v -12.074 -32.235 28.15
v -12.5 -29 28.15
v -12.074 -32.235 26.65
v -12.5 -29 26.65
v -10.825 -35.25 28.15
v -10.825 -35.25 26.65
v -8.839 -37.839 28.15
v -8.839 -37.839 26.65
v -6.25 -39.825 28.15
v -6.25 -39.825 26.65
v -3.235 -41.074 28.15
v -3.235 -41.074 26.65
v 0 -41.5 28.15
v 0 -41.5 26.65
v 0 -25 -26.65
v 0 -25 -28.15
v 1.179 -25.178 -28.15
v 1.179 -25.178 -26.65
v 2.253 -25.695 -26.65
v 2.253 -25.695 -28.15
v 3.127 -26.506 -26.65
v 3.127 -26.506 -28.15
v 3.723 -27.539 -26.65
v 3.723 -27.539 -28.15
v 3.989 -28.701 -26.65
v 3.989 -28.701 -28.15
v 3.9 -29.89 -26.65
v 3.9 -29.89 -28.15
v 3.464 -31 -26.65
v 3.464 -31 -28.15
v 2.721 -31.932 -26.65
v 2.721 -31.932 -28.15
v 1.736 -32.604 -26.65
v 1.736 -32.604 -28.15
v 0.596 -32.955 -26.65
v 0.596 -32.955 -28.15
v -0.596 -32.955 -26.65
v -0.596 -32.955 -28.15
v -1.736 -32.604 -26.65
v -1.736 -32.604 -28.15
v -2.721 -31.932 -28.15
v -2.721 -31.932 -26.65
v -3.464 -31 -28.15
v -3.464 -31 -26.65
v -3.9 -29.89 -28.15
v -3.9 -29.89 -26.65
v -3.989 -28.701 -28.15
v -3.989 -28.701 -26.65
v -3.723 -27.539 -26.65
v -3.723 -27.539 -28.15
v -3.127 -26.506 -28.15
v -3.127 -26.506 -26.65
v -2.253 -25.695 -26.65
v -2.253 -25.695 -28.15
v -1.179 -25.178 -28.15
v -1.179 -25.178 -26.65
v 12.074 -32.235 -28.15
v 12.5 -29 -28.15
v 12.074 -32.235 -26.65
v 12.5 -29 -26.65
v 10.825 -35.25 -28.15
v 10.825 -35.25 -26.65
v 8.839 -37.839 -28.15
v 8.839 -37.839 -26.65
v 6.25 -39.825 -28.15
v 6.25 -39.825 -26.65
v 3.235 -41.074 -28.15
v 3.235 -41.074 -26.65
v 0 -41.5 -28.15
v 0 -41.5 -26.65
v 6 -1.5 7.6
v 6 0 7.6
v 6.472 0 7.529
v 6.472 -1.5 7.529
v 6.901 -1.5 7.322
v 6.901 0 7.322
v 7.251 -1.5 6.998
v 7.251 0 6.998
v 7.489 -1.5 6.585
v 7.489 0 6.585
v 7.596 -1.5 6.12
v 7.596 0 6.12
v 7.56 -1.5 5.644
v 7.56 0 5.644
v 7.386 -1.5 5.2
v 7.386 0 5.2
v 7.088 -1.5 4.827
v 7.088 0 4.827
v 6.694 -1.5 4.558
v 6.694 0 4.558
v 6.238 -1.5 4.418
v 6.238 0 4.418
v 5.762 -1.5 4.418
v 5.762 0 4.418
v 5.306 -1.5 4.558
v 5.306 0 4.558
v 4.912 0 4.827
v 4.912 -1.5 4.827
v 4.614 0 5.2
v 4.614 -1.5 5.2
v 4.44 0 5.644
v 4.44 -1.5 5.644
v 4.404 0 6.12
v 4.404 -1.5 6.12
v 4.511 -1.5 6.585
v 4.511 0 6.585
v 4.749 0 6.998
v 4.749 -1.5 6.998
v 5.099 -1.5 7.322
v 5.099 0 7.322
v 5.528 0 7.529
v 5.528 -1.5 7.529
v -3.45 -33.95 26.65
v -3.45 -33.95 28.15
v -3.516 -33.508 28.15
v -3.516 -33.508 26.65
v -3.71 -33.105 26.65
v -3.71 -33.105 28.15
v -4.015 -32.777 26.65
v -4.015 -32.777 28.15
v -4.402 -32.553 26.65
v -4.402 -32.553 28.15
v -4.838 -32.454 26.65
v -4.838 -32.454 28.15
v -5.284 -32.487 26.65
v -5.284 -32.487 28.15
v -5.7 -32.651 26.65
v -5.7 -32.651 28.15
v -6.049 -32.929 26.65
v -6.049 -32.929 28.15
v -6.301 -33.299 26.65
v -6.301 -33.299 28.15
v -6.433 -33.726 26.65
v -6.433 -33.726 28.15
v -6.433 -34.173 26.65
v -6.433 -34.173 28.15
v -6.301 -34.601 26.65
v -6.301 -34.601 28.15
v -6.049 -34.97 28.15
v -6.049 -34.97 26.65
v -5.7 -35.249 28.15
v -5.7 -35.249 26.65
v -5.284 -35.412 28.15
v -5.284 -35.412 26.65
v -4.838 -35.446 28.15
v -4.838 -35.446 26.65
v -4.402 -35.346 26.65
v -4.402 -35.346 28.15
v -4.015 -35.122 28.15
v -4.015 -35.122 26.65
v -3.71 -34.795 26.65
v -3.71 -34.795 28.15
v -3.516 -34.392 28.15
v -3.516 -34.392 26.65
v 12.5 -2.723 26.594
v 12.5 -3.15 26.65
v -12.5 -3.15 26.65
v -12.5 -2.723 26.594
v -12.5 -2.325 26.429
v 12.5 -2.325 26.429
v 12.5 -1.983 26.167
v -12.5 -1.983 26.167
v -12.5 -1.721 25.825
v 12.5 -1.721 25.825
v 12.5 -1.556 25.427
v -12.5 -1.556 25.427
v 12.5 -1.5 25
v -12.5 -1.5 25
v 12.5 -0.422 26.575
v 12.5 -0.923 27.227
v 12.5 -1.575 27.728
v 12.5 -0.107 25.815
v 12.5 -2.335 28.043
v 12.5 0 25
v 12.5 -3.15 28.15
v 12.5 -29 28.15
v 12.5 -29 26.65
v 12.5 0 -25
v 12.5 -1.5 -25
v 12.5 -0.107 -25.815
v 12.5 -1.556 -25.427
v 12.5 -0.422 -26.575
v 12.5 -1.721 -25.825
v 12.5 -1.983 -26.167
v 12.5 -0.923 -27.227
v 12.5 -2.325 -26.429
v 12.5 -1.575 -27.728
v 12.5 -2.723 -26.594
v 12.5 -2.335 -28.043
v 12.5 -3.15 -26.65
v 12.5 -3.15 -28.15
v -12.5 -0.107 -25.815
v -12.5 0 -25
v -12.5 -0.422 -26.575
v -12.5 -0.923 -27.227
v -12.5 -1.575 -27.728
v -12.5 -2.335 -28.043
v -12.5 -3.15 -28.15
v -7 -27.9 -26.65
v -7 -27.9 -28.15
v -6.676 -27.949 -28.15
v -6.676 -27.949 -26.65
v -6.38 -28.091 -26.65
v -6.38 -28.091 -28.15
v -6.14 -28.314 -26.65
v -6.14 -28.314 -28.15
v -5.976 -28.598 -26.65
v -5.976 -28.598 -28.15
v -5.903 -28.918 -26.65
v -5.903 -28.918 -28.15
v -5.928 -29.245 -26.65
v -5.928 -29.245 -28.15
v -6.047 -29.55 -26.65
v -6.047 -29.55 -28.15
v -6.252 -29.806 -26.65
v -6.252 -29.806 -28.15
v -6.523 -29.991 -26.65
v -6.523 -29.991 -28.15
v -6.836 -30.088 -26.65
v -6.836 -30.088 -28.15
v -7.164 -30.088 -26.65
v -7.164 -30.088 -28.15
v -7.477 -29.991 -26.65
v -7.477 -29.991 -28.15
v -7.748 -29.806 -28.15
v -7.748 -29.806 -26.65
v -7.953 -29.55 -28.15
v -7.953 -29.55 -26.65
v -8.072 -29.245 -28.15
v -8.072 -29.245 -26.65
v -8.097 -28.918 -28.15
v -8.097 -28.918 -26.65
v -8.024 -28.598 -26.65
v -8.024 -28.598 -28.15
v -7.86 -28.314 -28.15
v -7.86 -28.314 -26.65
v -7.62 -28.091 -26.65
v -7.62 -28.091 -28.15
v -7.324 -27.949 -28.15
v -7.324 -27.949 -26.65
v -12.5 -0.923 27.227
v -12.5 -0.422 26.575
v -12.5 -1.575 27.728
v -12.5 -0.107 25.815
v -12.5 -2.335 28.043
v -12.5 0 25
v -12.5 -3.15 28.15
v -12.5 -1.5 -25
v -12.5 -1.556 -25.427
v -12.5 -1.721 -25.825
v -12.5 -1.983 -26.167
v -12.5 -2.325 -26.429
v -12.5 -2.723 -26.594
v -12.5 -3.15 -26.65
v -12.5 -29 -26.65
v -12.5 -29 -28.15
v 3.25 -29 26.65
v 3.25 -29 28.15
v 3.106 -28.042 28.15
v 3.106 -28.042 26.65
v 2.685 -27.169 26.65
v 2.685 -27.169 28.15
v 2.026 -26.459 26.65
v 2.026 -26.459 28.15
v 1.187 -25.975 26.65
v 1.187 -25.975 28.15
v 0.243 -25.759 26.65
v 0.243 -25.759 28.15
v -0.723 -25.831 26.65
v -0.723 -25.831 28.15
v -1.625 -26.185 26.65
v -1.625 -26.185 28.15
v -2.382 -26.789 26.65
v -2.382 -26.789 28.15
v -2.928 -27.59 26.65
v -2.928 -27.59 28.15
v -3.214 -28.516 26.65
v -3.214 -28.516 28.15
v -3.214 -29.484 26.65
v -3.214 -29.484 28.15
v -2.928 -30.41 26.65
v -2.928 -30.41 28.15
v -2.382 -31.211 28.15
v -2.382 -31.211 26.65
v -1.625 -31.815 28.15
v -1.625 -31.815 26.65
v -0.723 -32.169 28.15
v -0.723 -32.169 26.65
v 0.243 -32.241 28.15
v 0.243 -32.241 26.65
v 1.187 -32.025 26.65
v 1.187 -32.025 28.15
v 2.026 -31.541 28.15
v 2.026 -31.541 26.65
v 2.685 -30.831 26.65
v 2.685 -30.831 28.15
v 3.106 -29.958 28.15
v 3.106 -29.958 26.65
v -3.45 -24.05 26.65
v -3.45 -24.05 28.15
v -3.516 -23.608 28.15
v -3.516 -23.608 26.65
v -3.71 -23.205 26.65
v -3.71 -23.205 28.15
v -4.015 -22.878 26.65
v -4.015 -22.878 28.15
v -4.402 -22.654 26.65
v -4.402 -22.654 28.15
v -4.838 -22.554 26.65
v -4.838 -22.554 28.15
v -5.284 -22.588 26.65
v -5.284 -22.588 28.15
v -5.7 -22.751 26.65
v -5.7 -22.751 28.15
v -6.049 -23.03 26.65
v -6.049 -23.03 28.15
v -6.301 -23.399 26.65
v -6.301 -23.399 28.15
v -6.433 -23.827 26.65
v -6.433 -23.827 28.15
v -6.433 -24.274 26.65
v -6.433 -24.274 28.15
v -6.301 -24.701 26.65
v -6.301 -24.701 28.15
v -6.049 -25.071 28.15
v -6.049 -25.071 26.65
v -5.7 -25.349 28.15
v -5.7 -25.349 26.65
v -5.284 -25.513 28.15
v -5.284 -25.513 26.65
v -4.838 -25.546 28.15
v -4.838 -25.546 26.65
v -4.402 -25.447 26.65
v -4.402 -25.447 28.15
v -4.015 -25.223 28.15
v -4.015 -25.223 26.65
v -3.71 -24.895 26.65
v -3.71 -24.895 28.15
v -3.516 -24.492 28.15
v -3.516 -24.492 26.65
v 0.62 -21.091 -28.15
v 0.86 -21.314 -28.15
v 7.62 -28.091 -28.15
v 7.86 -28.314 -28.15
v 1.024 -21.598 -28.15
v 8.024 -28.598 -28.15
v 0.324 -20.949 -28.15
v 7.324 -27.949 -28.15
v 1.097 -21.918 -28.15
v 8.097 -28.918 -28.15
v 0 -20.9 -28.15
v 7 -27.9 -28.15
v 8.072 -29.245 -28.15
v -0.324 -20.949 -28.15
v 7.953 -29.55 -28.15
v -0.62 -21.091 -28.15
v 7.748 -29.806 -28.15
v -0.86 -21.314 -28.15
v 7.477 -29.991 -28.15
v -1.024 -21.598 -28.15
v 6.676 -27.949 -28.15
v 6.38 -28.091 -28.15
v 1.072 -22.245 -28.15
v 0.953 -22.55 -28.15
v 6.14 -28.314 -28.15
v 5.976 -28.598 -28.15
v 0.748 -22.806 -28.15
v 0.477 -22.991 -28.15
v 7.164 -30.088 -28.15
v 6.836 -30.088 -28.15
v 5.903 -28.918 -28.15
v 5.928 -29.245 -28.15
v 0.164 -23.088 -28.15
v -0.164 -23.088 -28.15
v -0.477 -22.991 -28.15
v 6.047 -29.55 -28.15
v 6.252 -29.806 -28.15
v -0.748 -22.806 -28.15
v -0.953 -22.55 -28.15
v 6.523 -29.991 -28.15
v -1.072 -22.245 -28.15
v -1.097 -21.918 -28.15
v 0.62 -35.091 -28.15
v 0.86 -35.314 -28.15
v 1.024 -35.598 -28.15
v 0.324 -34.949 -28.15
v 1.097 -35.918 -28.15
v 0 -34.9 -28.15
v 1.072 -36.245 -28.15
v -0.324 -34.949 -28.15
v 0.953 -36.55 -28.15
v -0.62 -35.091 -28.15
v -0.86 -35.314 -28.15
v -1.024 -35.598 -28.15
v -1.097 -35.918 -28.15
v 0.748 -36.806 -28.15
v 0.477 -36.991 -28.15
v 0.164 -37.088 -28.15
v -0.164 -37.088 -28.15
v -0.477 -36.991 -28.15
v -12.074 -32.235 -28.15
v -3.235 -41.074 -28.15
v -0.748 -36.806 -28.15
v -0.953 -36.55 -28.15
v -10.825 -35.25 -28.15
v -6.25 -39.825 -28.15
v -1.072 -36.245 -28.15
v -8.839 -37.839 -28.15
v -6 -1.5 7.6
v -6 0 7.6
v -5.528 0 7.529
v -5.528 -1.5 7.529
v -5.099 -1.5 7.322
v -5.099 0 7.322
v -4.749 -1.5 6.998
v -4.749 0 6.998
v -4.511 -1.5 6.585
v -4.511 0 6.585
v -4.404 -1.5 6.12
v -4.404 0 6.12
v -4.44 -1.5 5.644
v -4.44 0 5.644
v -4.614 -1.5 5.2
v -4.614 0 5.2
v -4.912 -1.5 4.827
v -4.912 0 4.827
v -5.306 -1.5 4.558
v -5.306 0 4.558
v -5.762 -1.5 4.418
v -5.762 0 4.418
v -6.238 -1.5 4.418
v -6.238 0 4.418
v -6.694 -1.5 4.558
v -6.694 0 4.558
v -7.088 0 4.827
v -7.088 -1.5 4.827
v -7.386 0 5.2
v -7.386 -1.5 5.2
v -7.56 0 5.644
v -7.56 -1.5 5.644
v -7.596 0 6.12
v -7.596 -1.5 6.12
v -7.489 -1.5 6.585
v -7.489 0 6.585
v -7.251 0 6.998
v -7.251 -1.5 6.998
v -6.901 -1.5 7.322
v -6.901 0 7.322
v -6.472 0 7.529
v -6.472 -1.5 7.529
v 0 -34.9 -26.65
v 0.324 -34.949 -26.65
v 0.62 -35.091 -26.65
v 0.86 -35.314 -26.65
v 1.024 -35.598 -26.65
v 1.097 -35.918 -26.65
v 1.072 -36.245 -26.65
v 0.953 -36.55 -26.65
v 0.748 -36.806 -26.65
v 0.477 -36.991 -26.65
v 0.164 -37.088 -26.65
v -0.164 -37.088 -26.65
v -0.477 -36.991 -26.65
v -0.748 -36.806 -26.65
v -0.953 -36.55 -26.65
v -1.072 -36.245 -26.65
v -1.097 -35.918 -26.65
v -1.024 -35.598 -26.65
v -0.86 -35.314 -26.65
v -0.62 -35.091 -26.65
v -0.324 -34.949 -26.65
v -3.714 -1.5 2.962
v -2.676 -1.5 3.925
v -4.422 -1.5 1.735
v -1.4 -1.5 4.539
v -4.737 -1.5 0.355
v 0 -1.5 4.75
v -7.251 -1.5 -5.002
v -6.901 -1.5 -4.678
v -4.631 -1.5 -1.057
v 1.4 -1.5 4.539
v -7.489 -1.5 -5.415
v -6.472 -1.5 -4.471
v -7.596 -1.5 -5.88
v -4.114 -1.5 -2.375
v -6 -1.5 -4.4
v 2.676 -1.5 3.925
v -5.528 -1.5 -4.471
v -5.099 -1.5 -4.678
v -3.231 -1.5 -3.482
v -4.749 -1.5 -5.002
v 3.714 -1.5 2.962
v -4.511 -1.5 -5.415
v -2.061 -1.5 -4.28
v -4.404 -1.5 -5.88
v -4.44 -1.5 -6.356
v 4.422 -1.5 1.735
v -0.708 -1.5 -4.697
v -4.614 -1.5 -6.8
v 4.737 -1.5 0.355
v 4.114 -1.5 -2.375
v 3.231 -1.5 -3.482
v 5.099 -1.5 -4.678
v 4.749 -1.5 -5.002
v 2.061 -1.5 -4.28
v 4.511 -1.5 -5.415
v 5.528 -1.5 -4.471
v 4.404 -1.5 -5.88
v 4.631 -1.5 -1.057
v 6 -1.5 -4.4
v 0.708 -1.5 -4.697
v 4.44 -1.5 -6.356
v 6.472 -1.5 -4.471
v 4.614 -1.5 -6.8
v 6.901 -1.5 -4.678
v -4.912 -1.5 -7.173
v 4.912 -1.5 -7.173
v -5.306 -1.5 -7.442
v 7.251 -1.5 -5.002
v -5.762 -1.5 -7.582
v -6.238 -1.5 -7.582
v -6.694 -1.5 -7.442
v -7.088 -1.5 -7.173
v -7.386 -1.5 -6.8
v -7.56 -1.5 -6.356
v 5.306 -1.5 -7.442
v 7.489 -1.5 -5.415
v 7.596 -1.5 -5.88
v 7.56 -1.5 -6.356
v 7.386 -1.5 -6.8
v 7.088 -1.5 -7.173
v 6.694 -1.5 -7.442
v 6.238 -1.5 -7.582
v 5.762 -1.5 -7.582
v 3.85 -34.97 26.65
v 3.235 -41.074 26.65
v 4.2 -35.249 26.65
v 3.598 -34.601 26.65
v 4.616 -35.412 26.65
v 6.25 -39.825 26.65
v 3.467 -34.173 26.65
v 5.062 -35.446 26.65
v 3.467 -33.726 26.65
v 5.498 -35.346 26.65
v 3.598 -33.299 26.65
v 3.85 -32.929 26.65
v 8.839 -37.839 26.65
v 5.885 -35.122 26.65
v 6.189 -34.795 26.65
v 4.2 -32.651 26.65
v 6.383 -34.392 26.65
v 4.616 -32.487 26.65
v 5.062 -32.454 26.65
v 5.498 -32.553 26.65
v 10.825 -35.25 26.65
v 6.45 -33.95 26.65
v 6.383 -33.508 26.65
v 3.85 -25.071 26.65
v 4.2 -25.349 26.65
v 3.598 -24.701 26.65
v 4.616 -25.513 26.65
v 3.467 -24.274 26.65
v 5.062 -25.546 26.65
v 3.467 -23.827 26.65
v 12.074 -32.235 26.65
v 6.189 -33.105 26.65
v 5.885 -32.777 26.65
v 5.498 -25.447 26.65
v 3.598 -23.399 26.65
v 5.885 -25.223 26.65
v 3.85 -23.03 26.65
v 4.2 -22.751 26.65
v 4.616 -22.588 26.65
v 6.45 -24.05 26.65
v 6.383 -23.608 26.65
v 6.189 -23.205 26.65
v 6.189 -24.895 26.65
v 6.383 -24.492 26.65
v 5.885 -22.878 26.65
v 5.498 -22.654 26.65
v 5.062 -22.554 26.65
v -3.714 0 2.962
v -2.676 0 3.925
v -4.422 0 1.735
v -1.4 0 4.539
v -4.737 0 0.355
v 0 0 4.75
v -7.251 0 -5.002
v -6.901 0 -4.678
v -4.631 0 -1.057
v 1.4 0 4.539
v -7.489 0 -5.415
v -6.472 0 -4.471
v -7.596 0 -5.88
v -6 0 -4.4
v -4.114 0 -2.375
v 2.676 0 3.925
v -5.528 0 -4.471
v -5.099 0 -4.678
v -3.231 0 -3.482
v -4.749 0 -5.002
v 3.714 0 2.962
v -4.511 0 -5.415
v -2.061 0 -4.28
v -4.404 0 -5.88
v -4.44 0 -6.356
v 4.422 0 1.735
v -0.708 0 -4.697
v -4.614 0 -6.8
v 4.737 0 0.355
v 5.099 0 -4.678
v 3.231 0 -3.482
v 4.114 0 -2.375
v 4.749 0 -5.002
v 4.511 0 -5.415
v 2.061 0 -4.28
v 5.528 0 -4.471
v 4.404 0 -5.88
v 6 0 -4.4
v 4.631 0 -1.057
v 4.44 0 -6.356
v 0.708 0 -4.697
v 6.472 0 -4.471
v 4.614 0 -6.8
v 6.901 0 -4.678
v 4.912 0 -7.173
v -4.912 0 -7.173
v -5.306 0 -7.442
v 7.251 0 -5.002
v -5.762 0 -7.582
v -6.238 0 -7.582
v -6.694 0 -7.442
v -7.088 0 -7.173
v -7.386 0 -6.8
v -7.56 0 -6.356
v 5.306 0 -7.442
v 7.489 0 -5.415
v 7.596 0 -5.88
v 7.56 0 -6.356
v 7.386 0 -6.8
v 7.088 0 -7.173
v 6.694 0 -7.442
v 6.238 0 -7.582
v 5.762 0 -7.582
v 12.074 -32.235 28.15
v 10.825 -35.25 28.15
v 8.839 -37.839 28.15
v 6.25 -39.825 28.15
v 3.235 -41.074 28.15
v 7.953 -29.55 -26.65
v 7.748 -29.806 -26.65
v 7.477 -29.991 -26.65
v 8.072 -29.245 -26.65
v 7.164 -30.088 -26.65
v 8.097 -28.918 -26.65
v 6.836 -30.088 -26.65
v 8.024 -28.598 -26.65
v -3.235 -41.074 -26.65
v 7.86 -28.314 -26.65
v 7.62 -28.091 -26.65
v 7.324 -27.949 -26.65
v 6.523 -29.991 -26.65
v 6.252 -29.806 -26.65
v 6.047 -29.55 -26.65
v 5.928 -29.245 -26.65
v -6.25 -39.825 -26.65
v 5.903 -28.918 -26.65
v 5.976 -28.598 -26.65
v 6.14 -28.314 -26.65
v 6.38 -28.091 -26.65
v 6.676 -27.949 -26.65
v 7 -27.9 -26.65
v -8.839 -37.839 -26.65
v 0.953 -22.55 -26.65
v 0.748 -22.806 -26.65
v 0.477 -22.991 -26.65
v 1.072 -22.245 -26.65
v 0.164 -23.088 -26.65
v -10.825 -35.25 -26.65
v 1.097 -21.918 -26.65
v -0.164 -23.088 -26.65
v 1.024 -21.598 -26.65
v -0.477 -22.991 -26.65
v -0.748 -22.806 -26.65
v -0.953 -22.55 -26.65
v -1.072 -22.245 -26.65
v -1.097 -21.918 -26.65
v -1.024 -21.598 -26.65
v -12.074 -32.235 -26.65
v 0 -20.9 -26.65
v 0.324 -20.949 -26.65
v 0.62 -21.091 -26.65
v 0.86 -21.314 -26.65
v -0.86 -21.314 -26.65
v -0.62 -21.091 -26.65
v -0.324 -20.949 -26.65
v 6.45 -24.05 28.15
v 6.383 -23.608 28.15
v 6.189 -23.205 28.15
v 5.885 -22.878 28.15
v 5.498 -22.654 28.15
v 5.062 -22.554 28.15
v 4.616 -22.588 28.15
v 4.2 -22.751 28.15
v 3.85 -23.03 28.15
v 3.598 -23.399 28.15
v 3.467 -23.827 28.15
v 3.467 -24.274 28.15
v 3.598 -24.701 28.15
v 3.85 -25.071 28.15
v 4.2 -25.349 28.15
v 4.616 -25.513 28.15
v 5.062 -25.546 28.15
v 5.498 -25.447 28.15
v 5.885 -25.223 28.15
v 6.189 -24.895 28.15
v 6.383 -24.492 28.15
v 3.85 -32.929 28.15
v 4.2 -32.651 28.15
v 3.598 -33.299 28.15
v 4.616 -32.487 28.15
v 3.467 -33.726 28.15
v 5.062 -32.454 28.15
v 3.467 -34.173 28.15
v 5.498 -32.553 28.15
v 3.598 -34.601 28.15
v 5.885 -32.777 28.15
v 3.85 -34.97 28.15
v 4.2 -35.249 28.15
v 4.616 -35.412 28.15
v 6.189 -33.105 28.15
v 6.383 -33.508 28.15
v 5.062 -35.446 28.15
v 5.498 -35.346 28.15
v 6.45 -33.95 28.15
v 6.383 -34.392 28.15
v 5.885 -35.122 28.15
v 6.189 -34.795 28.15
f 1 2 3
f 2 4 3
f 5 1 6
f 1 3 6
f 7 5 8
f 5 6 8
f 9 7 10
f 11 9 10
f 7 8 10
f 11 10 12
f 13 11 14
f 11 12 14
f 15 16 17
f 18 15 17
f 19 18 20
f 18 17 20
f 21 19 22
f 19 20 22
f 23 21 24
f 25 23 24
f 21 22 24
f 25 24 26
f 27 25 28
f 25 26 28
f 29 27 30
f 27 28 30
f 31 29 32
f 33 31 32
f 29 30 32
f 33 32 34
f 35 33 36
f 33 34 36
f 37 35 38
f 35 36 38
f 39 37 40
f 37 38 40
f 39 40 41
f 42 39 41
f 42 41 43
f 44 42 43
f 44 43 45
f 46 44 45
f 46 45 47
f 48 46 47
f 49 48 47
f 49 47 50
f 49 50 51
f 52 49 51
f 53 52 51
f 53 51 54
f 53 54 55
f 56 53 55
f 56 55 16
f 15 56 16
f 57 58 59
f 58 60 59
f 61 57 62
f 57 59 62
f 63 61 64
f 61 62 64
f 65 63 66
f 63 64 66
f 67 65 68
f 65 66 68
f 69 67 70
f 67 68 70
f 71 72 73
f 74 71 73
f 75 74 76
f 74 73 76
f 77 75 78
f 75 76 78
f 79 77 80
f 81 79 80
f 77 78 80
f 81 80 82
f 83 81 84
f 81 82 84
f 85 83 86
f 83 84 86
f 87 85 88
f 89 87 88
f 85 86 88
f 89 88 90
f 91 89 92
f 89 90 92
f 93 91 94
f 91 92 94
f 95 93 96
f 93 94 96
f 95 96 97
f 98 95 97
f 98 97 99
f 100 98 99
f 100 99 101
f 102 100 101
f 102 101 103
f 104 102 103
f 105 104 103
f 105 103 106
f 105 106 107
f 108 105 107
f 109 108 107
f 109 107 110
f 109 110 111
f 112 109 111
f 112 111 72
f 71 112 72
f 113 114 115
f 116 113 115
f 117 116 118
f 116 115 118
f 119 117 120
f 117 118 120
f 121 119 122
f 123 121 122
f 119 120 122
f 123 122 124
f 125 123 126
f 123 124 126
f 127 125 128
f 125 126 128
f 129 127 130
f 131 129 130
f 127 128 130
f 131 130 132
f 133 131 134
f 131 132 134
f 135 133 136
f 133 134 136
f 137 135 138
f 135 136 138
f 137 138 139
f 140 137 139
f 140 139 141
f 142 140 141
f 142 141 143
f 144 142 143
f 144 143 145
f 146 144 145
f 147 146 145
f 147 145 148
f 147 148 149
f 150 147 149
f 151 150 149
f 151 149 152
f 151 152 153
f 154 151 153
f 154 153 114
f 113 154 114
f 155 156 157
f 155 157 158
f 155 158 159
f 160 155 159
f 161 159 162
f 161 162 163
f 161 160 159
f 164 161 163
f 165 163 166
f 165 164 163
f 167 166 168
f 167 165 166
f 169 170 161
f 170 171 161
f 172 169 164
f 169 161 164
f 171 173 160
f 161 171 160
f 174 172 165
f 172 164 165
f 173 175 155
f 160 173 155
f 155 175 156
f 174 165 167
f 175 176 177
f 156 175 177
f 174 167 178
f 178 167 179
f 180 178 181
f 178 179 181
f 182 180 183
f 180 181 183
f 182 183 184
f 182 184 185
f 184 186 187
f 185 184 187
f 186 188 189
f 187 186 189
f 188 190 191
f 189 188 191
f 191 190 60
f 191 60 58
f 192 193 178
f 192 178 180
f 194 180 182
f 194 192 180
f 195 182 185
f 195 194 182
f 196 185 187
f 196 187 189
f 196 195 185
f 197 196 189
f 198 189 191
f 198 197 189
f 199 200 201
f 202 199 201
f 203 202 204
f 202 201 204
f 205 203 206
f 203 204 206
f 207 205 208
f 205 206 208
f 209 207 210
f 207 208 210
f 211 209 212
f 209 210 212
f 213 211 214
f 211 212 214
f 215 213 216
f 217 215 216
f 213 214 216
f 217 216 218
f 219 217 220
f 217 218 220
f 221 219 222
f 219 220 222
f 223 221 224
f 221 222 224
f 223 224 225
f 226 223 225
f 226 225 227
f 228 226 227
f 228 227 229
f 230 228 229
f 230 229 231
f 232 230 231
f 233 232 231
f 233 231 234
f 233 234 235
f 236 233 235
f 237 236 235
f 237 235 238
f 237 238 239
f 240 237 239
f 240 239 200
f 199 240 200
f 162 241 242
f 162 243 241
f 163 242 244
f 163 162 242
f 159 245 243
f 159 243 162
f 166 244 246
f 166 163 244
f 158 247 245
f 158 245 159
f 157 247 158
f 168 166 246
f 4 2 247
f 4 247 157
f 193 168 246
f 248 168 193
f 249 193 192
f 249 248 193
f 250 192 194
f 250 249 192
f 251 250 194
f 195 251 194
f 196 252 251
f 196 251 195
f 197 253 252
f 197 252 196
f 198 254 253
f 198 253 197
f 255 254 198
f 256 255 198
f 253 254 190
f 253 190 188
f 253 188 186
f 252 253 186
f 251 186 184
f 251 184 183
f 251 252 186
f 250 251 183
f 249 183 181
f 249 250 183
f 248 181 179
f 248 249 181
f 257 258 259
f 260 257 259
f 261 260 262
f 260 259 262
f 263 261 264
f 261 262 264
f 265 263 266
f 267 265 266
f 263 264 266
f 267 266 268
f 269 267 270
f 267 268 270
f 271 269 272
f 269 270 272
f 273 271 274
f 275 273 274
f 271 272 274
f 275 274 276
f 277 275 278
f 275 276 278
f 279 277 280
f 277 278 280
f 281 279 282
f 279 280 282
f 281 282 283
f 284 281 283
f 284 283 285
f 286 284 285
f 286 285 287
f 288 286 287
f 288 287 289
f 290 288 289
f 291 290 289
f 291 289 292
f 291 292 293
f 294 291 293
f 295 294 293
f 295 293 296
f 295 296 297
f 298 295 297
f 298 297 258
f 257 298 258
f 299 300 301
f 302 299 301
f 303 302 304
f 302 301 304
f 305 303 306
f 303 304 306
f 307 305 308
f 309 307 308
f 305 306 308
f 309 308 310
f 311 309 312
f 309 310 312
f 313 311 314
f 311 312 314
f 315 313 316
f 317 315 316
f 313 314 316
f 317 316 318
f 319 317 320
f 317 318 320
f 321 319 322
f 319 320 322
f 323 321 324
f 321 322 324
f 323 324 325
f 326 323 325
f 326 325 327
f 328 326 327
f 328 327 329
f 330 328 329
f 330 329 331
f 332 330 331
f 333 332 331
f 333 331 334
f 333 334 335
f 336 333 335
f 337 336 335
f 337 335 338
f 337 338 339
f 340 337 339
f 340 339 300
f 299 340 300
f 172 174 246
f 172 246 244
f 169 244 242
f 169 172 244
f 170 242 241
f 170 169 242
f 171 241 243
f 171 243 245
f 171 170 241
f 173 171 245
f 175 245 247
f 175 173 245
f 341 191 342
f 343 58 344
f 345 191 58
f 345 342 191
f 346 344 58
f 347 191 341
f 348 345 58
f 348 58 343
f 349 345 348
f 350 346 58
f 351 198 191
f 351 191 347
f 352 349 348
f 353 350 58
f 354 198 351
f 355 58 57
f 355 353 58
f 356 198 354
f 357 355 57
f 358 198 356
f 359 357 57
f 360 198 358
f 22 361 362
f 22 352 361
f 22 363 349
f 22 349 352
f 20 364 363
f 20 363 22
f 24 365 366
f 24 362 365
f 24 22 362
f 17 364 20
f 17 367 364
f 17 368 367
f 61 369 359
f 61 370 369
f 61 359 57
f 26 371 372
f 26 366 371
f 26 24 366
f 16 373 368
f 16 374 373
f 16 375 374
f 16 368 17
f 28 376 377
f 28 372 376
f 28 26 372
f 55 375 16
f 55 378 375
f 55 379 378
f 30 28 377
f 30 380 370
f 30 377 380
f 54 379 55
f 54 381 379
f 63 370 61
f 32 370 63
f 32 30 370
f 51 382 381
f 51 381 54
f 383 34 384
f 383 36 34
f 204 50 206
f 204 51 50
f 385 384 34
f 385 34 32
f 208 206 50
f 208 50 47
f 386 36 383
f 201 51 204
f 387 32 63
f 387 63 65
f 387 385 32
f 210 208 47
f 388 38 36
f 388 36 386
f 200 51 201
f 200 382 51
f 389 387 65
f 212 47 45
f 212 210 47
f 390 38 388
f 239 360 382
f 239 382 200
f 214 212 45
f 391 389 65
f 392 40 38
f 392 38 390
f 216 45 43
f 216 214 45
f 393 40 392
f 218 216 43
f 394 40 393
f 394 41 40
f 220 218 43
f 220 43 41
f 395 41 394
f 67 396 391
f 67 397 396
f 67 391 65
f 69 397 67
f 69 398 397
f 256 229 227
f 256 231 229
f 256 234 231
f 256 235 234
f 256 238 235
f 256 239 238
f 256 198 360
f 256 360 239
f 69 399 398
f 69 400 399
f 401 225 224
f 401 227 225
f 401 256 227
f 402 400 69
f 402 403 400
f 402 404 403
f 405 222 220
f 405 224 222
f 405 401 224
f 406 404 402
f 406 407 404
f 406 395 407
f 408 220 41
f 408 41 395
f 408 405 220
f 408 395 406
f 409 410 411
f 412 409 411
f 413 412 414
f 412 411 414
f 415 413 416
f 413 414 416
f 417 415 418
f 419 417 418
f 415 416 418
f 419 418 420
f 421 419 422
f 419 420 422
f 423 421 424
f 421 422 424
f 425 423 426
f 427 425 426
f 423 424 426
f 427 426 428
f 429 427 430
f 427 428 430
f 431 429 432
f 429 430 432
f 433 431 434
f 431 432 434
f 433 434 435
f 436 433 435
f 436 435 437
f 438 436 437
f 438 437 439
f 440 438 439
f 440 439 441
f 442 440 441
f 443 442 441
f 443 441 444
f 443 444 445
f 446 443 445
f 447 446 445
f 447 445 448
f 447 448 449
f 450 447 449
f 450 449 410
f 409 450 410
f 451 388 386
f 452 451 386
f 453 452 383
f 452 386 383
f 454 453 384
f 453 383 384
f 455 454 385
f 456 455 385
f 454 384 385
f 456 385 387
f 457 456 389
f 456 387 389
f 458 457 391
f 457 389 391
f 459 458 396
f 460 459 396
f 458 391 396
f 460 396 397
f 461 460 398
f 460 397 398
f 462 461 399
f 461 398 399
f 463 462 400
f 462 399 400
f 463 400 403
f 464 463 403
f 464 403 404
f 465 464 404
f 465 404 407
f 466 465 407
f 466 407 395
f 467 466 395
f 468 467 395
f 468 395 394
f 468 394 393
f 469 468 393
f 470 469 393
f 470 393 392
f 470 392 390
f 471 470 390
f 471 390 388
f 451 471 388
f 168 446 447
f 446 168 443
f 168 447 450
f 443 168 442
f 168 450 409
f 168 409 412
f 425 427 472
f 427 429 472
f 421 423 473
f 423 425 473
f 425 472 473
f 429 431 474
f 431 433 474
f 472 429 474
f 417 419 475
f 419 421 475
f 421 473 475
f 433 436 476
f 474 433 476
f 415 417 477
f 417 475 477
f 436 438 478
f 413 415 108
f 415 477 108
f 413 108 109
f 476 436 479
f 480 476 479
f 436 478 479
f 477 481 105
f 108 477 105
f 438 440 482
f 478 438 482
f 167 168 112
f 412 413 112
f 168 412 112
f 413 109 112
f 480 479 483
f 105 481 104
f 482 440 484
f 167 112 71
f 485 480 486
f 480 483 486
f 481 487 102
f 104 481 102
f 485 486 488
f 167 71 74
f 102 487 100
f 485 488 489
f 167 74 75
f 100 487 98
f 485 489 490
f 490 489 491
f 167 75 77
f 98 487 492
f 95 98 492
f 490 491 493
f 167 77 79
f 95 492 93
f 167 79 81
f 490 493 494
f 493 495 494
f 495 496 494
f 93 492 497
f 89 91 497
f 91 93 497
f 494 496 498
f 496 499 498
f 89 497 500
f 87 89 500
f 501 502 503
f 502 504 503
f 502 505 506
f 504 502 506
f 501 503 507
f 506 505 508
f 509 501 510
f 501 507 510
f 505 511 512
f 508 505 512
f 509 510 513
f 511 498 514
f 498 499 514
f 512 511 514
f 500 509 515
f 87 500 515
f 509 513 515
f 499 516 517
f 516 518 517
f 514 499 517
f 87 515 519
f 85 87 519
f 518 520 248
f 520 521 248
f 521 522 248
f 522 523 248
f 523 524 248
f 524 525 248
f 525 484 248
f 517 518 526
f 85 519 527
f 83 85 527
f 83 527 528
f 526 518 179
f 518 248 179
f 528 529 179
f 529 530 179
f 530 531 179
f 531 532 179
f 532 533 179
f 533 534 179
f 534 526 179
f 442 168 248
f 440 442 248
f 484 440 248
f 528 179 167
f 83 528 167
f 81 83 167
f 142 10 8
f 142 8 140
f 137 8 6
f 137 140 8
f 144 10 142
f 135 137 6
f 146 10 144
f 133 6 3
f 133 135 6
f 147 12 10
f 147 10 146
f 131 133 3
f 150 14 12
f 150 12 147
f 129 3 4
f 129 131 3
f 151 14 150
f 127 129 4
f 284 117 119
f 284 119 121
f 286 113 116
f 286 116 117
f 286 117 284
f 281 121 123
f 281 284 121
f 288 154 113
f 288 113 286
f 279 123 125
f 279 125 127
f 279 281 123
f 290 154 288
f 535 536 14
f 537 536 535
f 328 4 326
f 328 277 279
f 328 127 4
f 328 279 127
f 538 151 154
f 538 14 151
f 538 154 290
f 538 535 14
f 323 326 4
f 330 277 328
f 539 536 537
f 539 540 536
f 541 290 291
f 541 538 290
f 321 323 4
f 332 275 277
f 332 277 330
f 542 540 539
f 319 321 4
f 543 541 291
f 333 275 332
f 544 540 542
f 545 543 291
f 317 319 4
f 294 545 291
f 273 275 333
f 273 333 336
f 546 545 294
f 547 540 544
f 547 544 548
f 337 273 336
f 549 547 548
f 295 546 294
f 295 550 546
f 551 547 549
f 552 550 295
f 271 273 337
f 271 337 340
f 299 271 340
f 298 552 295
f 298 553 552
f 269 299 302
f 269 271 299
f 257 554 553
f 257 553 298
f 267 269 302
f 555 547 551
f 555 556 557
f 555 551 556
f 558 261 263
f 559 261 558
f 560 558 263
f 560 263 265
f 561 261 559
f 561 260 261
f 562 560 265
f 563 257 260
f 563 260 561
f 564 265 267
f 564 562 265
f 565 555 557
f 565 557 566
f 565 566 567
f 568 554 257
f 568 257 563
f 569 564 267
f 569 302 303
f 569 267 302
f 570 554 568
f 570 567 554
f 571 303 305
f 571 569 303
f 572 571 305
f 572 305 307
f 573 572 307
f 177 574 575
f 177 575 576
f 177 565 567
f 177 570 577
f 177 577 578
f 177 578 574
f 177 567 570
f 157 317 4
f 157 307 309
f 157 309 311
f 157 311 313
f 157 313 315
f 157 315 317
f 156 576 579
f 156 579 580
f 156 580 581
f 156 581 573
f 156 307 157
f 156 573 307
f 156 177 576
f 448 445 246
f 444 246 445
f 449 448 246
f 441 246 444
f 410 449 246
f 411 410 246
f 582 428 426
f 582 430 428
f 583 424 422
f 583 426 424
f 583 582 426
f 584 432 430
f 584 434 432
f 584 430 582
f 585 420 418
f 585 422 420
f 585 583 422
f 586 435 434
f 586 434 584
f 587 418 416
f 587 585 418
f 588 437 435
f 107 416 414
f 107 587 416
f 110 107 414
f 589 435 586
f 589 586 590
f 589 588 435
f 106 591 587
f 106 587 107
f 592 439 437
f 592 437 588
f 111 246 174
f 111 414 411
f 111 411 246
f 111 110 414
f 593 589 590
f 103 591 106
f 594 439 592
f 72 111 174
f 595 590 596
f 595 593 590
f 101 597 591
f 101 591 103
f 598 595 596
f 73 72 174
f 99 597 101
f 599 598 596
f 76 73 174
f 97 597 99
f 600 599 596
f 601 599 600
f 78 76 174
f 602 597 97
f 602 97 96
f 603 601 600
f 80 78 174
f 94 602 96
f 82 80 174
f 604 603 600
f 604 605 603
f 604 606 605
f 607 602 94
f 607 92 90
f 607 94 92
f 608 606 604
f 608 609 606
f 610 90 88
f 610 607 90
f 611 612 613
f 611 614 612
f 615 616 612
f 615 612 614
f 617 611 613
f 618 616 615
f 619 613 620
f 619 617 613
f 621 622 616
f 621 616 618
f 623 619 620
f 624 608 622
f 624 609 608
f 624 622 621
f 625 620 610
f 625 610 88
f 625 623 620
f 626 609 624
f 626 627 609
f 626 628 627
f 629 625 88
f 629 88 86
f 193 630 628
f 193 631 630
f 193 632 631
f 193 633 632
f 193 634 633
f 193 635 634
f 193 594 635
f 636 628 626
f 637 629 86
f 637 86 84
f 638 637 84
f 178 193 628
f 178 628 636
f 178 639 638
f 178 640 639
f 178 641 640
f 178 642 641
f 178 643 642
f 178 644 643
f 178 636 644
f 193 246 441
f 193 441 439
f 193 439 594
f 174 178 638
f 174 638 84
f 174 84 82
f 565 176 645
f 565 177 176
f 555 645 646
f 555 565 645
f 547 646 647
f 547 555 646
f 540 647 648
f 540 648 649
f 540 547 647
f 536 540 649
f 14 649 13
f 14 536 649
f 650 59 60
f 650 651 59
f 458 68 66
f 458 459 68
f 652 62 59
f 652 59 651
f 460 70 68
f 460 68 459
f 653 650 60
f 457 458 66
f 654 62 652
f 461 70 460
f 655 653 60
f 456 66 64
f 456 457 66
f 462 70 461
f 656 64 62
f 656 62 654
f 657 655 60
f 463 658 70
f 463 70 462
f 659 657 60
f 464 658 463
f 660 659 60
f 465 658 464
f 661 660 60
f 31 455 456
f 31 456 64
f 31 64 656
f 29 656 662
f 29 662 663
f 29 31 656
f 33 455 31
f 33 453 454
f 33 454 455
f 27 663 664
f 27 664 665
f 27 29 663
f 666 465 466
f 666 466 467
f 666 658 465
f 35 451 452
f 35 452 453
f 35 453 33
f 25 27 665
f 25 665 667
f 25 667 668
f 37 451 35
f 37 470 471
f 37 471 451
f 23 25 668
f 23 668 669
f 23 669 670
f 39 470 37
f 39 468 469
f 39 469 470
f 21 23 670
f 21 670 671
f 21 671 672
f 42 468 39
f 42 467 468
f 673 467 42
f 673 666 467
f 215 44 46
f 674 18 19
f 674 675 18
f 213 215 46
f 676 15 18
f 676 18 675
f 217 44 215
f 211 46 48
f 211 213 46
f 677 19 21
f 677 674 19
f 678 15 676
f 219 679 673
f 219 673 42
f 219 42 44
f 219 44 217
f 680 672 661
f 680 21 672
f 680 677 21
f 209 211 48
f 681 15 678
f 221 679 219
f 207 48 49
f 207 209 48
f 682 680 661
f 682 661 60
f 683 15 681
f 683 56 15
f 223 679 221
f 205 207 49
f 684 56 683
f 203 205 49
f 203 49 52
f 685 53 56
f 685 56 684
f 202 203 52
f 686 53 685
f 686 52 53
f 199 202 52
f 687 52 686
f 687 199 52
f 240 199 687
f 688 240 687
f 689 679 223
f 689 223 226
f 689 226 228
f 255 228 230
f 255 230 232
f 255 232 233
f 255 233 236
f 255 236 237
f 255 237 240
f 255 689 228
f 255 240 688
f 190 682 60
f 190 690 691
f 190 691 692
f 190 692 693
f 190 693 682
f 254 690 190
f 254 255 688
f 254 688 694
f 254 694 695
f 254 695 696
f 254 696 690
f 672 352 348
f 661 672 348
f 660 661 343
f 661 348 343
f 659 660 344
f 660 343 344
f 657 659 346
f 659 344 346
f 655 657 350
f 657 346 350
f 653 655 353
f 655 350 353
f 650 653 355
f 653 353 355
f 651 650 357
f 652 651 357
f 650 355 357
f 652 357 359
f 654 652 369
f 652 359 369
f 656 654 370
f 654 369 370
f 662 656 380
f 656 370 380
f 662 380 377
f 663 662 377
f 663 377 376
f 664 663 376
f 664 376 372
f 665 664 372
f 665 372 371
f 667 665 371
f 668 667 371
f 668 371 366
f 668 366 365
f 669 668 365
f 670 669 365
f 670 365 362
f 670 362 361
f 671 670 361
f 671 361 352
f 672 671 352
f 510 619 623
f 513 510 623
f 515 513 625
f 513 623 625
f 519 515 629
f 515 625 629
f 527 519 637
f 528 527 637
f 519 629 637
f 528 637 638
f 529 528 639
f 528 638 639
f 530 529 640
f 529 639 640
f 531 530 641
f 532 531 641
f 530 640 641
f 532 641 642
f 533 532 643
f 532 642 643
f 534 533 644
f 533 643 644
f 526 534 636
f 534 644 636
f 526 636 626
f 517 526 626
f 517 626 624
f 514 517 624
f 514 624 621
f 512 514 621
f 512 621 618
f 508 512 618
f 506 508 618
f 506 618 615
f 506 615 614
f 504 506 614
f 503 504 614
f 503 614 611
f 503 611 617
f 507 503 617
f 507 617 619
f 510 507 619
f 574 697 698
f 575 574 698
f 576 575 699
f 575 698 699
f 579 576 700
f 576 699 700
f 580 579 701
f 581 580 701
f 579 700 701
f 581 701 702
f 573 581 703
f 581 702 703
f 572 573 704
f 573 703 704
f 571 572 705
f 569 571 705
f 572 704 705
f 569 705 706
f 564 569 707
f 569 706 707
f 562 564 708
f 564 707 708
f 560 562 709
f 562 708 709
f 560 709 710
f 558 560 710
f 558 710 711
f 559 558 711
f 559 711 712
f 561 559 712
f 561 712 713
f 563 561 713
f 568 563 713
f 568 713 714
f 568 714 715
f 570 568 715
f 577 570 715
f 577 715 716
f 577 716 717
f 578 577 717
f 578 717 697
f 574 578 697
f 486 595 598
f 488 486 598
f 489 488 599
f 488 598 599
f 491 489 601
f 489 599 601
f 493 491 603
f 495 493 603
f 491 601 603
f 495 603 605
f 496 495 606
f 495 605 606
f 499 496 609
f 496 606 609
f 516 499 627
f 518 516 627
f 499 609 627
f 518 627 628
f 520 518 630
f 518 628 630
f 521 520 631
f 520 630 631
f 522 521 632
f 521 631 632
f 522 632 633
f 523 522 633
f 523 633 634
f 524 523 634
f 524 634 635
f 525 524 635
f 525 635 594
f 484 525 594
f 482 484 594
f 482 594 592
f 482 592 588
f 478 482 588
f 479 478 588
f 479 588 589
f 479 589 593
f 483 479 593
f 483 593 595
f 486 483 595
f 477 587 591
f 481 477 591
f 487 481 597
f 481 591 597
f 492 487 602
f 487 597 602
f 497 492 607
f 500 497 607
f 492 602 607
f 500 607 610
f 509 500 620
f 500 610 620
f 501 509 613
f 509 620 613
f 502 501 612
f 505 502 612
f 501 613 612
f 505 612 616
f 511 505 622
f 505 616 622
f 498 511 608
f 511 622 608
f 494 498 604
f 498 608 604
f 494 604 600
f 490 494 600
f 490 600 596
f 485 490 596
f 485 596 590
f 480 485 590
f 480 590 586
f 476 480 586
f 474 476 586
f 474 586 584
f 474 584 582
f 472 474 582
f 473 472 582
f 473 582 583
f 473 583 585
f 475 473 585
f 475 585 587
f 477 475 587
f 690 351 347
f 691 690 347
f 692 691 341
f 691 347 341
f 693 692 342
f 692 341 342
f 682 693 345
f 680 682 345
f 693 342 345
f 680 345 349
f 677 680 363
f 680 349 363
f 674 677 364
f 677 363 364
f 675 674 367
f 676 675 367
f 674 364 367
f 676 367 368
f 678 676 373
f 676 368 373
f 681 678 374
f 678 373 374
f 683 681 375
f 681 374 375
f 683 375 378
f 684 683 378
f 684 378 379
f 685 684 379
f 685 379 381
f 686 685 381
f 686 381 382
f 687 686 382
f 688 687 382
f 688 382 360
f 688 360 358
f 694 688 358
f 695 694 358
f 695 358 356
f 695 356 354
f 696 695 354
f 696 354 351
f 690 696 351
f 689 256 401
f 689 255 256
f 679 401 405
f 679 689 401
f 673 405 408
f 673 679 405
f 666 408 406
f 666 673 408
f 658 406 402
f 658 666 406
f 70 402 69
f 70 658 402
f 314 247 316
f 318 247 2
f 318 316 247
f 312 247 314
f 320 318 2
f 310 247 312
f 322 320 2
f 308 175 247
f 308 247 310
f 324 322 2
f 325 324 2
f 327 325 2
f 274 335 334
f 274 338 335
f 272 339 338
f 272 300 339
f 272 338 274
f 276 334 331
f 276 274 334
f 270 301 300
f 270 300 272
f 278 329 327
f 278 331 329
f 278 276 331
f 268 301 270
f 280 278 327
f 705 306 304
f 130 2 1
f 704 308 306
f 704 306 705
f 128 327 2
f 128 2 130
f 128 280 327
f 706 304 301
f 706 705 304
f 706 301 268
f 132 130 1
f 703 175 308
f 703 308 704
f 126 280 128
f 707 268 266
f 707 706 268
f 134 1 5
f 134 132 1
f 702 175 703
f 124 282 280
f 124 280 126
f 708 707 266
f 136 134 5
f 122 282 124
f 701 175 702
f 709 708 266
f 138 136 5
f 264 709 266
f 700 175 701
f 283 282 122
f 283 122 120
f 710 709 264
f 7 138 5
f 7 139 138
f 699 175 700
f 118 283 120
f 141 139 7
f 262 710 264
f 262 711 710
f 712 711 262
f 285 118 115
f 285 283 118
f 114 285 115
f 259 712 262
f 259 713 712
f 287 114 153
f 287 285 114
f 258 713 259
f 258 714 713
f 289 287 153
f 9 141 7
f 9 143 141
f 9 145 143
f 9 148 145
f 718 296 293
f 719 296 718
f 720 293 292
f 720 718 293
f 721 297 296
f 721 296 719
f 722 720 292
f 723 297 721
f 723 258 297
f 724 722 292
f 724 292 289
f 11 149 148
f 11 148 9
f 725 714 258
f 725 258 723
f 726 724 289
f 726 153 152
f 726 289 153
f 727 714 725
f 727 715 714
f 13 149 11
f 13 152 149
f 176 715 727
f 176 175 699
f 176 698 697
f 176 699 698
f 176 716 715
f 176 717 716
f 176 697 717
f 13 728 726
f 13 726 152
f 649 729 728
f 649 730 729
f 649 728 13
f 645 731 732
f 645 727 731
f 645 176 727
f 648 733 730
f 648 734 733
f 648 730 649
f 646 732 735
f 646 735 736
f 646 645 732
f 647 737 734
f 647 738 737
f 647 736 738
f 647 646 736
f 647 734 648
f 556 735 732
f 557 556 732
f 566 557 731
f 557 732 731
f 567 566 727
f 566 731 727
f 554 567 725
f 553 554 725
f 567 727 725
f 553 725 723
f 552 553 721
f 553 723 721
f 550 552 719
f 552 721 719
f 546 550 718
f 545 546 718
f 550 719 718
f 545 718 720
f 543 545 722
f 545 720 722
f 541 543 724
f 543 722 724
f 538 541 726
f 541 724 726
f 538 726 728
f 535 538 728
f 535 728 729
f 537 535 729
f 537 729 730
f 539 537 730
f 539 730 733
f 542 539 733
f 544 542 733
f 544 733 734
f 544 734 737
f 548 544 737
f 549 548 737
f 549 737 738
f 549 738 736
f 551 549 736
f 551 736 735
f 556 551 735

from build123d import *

# Parameters (mm, degrees)
SKETCH1_W                      = 25
SKETCH1_H                      = 53.3
BASE_FLANGE1_DEPTH             = 1.5
EDGE_FLANGE1_STRIP_W           = 9.3
EDGE_FLANGE1_STRIP_H           = 1.5
EDGE_FLANGE1_STRIP_CUT_DEPTH   = 25
EDGE_FLANGE1_STRIP_2_W         = 9.3
EDGE_FLANGE1_STRIP_2_H         = 1.5
EDGE_FLANGE1_STRIP_CUT_2_DEPTH = 25
EDGE_FLANGE1_DEPTH             = 25
EDGE_FLANGE1_BEND_DEPTH        = 25
CUT_EXTRUDE1_REACH             = 73.051
SKETCH12_R                     = 1.5
SKETCH12_R_2                   = 3.25
CUT_EXTRUDE2_REACH             = 73.051
SKETCH13_R                     = 4
SKETCH13_R_2                   = 1.1
FILLET1_R                      = 12.5
SKETCH17_R                     = 1.6
SKETCH17_R_2                   = 4.75
CUT_EXTRUDE3_DEPTH             = 52.680968451


# Sheet-metal steps are written as plain solids
with BuildPart() as part:
    # Base-Flange1: sheet metal written as solids
    # Sketch1 → Base-Flange1 (new body)
    with BuildSketch(Plane(origin=(0, 0, 0), x_dir=(1, 0, 0), z_dir=(0, 1, 0))):
        Rectangle(SKETCH1_W, SKETCH1_H)
    extrude(amount=-BASE_FLANGE1_DEPTH)

    # Edge-Flange1: sheet metal written as solids
    # Edge-Flange1 strip (on a plane across the edge) → Edge-Flange1 strip cut (cut)
    with BuildSketch(Plane(origin=(12.5, -1.5, 26.65), x_dir=(0, 0, -1), z_dir=(-1, 0, 0))):
        with Locations((-3, -0.75)):
            Rectangle(EDGE_FLANGE1_STRIP_W, EDGE_FLANGE1_STRIP_H)
    extrude(amount=EDGE_FLANGE1_STRIP_CUT_DEPTH, mode=Mode.SUBTRACT)

    # Edge-Flange1 strip 2 (on a plane across the edge) → Edge-Flange1 strip cut 2 (cut)
    with BuildSketch(Plane(origin=(-12.5, -1.5, -26.65), x_dir=(0, 0, 1), z_dir=(1, 0, 0))):
        with Locations((-3, -0.75)):
            Rectangle(EDGE_FLANGE1_STRIP_2_W, EDGE_FLANGE1_STRIP_2_H)
    extrude(amount=EDGE_FLANGE1_STRIP_CUT_2_DEPTH, mode=Mode.SUBTRACT)

    # Edge-Flange1 section (on a plane across the edge) → Edge-Flange1 (add)
    with BuildSketch(Plane(origin=(12.5, -1.5, 26.65), x_dir=(0, 0, -1), z_dir=(-1, 0, 0))):
        with BuildLine():
            Line((-1.5, 1.65), (-1.5, 40))
            Line((-1.5, 40), (0, 40))
            Line((0, 40), (0, 1.65))
            ThreePointArc((0, 1.65), (0.483273811, 0.483273811), (1.65, 0))
            Line((1.65, 0), (1.65, -1.5))
            ThreePointArc((1.65, -1.5), (-0.577386361, -0.577386361), (-1.5, 1.65))
        make_face()
    extrude(amount=EDGE_FLANGE1_DEPTH)

    # Edge-Flange1 section 2 (on a plane across the edge) → Edge-Flange1 bend (add)
    with BuildSketch(Plane(origin=(-12.5, -1.5, -26.65), x_dir=(0, 0, 1), z_dir=(1, 0, 0))):
        with BuildLine():
            Line((-1.5, 1.65), (-1.5, 40))
            Line((-1.5, 40), (0, 40))
            Line((0, 40), (0, 1.65))
            ThreePointArc((0, 1.65), (0.483273811, 0.483273811), (1.65, 0))
            Line((1.65, 0), (1.65, -1.5))
            ThreePointArc((1.65, -1.5), (-0.577386361, -0.577386361), (-1.5, 1.65))
        make_face()
    extrude(amount=EDGE_FLANGE1_BEND_DEPTH)

    # Sketch12 → Cut-Extrude1 (cut, up to next)
    with BuildSketch(Plane.XY.offset(28.15), mode=Mode.PRIVATE) as cut_extrude1_sk1:
        with Locations((-4.949747468, -24.050252532)):
            Circle(SKETCH12_R)
    cut_extrude1_tool1 = extrude(cut_extrude1_sk1.sketch, amount=-CUT_EXTRUDE1_REACH, mode=Mode.PRIVATE) & part.part
    # Sketch12 → Cut-Extrude1 (cut, up to next)
    with BuildSketch(Plane.XY.offset(28.15), mode=Mode.PRIVATE) as cut_extrude1_sk2:
        with Locations((4.949747468, -24.050252532)):
            Circle(SKETCH12_R)
    cut_extrude1_tool2 = extrude(cut_extrude1_sk2.sketch, amount=-CUT_EXTRUDE1_REACH, mode=Mode.PRIVATE) & part.part
    # Sketch12 → Cut-Extrude1 (cut, up to next)
    with BuildSketch(Plane.XY.offset(28.15), mode=Mode.PRIVATE) as cut_extrude1_sk3:
        with Locations((-4.949747468, -33.949747468)):
            Circle(SKETCH12_R)
    cut_extrude1_tool3 = extrude(cut_extrude1_sk3.sketch, amount=-CUT_EXTRUDE1_REACH, mode=Mode.PRIVATE) & part.part
    # Sketch12 → Cut-Extrude1 (cut, up to next)
    with BuildSketch(Plane.XY.offset(28.15), mode=Mode.PRIVATE) as cut_extrude1_sk4:
        with Locations((4.949747468, -33.949747468)):
            Circle(SKETCH12_R)
    cut_extrude1_tool4 = extrude(cut_extrude1_sk4.sketch, amount=-CUT_EXTRUDE1_REACH, mode=Mode.PRIVATE) & part.part
    # Sketch12 → Cut-Extrude1 (cut, up to next)
    with BuildSketch(Plane.XY.offset(28.15), mode=Mode.PRIVATE) as cut_extrude1_sk5:
        with Locations((0, -29)):
            Circle(SKETCH12_R_2)
    cut_extrude1_tool5 = extrude(cut_extrude1_sk5.sketch, amount=-CUT_EXTRUDE1_REACH, mode=Mode.PRIVATE) & part.part
    add(cut_extrude1_tool1.solids().sort_by_distance((-4.949747, -24.050253, 28.15))[0], mode=Mode.SUBTRACT)
    add(cut_extrude1_tool2.solids().sort_by_distance((4.949747, -24.050253, 28.15))[0], mode=Mode.SUBTRACT)
    add(cut_extrude1_tool3.solids().sort_by_distance((-4.949747, -33.949747, 28.15))[0], mode=Mode.SUBTRACT)
    add(cut_extrude1_tool4.solids().sort_by_distance((4.949747, -33.949747, 28.15))[0], mode=Mode.SUBTRACT)
    add(cut_extrude1_tool5.solids().sort_by_distance((0, -29, 28.15))[0], mode=Mode.SUBTRACT)

    # Sketch13 → Cut-Extrude2 (cut, up to next)
    with BuildSketch(Plane(origin=(0, 0, -28.15), x_dir=(-1, 0, 0), z_dir=(0, 0, -1)), mode=Mode.PRIVATE) as cut_extrude2_sk1:
        with Locations(Location((0, -29, 0), (0, 0, 90))):
            Circle(SKETCH13_R)
    cut_extrude2_tool1 = extrude(cut_extrude2_sk1.sketch, amount=-CUT_EXTRUDE2_REACH, mode=Mode.PRIVATE) & part.part
    # Sketch13 → Cut-Extrude2 (cut, up to next)
    with BuildSketch(Plane(origin=(0, 0, -28.15), x_dir=(-1, 0, 0), z_dir=(0, 0, -1)), mode=Mode.PRIVATE) as cut_extrude2_sk2:
        with Locations(Location((0, -36, 0), (0, 0, 90))):
            Circle(SKETCH13_R_2)
    cut_extrude2_tool2 = extrude(cut_extrude2_sk2.sketch, amount=-CUT_EXTRUDE2_REACH, mode=Mode.PRIVATE) & part.part
    # Sketch13 → Cut-Extrude2 (cut, up to next)
    with BuildSketch(Plane(origin=(0, 0, -28.15), x_dir=(-1, 0, 0), z_dir=(0, 0, -1)), mode=Mode.PRIVATE) as cut_extrude2_sk3:
        with Locations(Location((-7, -29, 0), (0, 0, 90))):
            Circle(SKETCH13_R_2)
    cut_extrude2_tool3 = extrude(cut_extrude2_sk3.sketch, amount=-CUT_EXTRUDE2_REACH, mode=Mode.PRIVATE) & part.part
    # Sketch13 → Cut-Extrude2 (cut, up to next)
    with BuildSketch(Plane(origin=(0, 0, -28.15), x_dir=(-1, 0, 0), z_dir=(0, 0, -1)), mode=Mode.PRIVATE) as cut_extrude2_sk4:
        with Locations(Location((0, -22, 0), (0, 0, 90))):
            Circle(SKETCH13_R_2)
    cut_extrude2_tool4 = extrude(cut_extrude2_sk4.sketch, amount=-CUT_EXTRUDE2_REACH, mode=Mode.PRIVATE) & part.part
    # Sketch13 → Cut-Extrude2 (cut, up to next)
    with BuildSketch(Plane(origin=(0, 0, -28.15), x_dir=(-1, 0, 0), z_dir=(0, 0, -1)), mode=Mode.PRIVATE) as cut_extrude2_sk5:
        with Locations(Location((7, -29, 0), (0, 0, 90))):
            Circle(SKETCH13_R_2)
    cut_extrude2_tool5 = extrude(cut_extrude2_sk5.sketch, amount=-CUT_EXTRUDE2_REACH, mode=Mode.PRIVATE) & part.part
    add(cut_extrude2_tool1.solids().sort_by_distance((0, -29, -28.15))[0], mode=Mode.SUBTRACT)
    add(cut_extrude2_tool2.solids().sort_by_distance((0, -36, -28.15))[0], mode=Mode.SUBTRACT)
    add(cut_extrude2_tool3.solids().sort_by_distance((7, -29, -28.15))[0], mode=Mode.SUBTRACT)
    add(cut_extrude2_tool4.solids().sort_by_distance((0, -22, -28.15))[0], mode=Mode.SUBTRACT)
    add(cut_extrude2_tool5.solids().sort_by_distance((-7, -29, -28.15))[0], mode=Mode.SUBTRACT)

    # Fillet1
    fillet1_edges = [part.edges().sort_by_distance(p)[0] for p in [
        (12.5, -41.5, 27.4),
        (-12.5, -41.5, 27.4),
        (-12.5, -41.5, -27.4),
        (12.5, -41.5, -27.4),
    ]]
    fillet(fillet1_edges, radius=FILLET1_R - 0.0001)  # a hair under: the kernel refuses the full size

    # Sketch17 → Cut-Extrude3 (cut, through all)
    with BuildSketch(Plane(origin=(0, 0, 0), x_dir=(1, 0, 0), z_dir=(0, 1, 0))):
        with Locations(Location((-6, 6, 0), (0, 0, 270))):
            Circle(SKETCH17_R)
        with Locations(Location((6, 6, 0), (0, 0, 270))):
            Circle(SKETCH17_R)
        with Locations(Location((6, -6, 0), (0, 0, 270))):
            Circle(SKETCH17_R)
        with Locations(Location((-6, -6, 0), (0, 0, 270))):
            Circle(SKETCH17_R)
        with Locations(Location((0, 0, 0), (0, 0, 270))):
            Circle(SKETCH17_R_2)
    extrude(amount=-CUT_EXTRUDE3_DEPTH, mode=Mode.SUBTRACT)


solid = part.part
